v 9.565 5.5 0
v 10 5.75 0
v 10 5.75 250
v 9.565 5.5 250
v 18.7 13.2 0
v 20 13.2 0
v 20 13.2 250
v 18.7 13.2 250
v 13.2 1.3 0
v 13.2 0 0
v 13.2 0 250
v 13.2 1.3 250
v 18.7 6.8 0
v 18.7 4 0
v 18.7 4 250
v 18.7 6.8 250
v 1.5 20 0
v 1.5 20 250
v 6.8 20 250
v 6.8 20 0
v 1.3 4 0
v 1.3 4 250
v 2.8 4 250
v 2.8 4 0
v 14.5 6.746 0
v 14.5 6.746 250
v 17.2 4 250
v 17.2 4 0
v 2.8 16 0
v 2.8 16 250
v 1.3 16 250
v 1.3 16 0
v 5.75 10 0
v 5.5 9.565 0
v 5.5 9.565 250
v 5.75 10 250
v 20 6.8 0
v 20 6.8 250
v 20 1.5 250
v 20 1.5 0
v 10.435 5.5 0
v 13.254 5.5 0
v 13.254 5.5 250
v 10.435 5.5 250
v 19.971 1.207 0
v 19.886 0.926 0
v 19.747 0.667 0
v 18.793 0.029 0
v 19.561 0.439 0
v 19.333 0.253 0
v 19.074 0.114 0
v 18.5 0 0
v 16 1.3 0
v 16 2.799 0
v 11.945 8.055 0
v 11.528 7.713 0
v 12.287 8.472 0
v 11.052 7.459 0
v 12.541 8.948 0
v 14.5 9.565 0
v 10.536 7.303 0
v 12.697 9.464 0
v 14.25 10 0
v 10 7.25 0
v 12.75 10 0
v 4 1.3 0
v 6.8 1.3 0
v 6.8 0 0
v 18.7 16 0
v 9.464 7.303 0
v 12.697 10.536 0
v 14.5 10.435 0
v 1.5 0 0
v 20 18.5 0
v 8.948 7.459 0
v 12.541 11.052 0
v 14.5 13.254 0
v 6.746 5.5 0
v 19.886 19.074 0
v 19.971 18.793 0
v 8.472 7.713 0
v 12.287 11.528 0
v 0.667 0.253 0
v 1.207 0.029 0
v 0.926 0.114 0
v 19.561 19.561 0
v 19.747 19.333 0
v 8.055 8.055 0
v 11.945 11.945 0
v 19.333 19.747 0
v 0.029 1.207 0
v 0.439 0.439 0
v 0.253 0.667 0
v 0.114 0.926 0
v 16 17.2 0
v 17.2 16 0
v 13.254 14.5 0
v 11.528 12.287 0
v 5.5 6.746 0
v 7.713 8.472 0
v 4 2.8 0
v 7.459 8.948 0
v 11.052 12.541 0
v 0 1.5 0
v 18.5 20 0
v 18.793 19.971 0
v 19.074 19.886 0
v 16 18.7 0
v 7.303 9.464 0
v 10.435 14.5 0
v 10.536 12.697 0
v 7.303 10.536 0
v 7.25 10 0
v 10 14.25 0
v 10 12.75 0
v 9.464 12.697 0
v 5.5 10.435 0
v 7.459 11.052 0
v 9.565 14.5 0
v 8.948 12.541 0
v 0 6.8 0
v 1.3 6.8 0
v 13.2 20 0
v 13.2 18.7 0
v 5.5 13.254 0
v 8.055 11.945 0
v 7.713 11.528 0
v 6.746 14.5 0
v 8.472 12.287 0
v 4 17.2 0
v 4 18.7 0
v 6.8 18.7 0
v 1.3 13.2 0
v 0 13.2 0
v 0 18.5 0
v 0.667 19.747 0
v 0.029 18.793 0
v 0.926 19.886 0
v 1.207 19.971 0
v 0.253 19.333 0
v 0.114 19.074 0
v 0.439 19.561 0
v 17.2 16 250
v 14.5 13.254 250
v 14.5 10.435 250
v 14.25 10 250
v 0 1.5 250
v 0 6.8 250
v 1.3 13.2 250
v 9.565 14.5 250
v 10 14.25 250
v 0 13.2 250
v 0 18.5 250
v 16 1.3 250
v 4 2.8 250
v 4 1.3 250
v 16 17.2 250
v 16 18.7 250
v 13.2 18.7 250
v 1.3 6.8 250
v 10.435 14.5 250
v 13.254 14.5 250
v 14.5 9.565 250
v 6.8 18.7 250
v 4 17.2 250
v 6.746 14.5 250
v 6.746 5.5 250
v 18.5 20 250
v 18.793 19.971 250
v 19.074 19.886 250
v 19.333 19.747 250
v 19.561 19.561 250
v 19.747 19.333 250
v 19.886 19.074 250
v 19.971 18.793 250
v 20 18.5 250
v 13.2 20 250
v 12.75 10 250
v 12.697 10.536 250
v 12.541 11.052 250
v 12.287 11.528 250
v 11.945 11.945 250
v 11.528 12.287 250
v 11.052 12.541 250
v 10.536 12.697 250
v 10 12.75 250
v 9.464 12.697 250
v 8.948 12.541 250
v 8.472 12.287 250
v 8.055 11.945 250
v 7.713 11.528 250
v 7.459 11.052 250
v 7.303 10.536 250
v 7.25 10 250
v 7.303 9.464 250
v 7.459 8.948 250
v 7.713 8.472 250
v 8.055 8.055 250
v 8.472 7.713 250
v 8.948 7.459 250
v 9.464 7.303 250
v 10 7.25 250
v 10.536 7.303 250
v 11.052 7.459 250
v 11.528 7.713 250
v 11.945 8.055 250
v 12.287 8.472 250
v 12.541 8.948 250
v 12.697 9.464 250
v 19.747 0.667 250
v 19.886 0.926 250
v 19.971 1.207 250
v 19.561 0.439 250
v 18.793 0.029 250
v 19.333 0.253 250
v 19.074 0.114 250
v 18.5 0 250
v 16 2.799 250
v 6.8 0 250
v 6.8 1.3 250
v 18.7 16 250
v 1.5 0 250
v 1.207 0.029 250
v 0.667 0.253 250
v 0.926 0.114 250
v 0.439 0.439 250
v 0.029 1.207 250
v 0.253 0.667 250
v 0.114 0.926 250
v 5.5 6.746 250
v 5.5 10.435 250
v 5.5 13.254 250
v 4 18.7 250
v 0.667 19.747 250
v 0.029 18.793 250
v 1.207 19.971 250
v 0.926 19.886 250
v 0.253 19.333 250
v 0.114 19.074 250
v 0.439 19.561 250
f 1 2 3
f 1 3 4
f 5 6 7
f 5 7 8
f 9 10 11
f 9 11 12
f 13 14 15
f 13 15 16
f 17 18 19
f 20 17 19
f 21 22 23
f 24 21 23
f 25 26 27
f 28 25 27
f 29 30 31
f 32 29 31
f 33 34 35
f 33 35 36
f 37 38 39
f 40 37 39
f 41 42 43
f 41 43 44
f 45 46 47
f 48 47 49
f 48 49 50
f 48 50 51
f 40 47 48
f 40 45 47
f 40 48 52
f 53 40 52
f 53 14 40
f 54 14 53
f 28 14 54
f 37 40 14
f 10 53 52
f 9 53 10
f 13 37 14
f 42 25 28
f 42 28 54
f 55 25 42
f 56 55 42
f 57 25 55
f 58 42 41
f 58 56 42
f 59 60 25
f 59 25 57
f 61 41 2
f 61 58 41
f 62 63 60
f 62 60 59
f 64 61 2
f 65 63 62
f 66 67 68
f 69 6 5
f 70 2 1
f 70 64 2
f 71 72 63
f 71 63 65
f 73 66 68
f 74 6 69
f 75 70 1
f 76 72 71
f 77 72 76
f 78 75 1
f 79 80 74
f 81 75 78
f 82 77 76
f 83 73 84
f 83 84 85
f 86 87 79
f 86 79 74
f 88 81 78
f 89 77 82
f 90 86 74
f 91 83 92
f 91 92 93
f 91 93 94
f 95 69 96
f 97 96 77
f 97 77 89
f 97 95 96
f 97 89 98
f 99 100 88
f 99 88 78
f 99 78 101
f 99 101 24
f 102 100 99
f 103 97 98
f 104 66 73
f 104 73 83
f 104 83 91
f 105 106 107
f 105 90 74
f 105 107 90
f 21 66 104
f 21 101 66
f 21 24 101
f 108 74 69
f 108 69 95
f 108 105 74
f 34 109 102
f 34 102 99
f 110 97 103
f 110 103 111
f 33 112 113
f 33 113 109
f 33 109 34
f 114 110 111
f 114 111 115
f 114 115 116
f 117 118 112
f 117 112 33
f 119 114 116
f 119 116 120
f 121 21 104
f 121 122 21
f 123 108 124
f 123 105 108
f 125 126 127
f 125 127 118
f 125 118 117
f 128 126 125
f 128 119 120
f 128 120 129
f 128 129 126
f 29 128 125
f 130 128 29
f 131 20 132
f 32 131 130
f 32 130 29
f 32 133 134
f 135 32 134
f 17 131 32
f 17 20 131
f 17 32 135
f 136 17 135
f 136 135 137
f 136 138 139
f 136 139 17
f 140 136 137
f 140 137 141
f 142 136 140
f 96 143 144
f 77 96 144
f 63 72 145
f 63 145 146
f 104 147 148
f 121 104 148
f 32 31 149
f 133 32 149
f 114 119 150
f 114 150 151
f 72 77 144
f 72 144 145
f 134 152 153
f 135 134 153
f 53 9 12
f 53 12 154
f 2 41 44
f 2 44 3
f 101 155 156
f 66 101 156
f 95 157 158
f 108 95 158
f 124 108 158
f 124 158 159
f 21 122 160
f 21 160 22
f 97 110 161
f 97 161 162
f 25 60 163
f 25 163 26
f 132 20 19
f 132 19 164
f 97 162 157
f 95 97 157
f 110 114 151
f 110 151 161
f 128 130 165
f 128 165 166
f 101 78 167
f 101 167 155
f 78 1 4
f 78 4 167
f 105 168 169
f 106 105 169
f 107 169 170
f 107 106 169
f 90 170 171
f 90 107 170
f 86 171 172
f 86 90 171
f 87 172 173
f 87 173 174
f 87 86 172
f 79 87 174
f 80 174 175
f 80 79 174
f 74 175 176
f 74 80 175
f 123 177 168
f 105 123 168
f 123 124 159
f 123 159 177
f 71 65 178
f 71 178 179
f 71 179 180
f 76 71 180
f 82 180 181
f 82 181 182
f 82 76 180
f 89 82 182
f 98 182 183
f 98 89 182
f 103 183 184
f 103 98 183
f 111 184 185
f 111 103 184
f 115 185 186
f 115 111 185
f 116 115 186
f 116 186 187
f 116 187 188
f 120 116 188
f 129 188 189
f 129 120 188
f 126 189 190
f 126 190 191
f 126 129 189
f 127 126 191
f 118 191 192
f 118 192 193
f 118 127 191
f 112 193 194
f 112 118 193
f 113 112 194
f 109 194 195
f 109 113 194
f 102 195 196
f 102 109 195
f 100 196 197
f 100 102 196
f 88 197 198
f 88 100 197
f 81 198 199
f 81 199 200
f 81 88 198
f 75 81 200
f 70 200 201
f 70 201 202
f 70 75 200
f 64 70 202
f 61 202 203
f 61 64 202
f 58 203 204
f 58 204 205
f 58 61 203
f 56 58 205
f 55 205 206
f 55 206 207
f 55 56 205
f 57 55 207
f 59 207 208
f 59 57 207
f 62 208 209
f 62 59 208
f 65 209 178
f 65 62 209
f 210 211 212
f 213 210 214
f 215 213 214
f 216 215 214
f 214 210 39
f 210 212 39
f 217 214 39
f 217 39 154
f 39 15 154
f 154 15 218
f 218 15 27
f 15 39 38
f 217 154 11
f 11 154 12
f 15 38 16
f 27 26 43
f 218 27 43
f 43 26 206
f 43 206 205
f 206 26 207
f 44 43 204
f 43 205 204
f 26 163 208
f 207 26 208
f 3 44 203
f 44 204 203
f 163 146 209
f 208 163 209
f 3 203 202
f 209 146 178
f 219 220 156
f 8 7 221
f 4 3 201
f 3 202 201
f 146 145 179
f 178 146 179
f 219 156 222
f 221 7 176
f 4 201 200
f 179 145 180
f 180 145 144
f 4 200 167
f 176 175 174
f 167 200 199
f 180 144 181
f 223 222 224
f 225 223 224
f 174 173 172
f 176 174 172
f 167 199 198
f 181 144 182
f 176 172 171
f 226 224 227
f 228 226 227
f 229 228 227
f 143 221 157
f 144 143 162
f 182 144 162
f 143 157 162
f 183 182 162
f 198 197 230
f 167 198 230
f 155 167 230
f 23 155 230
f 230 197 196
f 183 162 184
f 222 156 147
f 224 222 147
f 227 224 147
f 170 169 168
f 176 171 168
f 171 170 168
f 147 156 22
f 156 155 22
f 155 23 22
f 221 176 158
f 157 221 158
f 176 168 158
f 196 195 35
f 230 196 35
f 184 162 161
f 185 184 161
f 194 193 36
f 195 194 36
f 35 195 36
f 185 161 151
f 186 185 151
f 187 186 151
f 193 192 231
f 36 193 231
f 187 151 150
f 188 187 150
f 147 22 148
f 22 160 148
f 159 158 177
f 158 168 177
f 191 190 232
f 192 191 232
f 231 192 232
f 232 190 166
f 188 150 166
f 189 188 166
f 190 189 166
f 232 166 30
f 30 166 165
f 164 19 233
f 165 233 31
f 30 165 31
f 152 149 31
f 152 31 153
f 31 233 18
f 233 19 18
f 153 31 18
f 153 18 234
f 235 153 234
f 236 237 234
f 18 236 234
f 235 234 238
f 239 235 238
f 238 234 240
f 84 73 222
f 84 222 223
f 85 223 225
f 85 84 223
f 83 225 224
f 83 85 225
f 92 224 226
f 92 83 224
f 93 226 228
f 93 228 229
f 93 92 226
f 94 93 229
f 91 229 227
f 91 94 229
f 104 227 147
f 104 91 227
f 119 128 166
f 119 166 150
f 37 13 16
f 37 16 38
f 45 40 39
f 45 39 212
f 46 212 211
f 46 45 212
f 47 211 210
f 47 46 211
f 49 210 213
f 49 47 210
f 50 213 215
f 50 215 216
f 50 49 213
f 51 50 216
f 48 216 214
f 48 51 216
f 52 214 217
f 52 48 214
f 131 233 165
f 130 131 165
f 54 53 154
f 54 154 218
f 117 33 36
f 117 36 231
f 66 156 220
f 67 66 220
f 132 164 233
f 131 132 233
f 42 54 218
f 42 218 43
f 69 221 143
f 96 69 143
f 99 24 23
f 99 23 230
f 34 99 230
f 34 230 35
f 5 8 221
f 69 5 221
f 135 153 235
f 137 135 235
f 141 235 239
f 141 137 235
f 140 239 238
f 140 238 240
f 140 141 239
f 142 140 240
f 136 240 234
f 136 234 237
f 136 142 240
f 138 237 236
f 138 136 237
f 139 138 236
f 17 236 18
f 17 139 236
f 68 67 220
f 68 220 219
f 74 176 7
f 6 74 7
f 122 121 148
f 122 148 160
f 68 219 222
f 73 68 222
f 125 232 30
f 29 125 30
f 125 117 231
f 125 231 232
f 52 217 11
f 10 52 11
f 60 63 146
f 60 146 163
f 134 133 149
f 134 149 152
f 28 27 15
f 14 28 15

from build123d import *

# Parameters (mm, degrees)
MODEL_R             = 2.75
BOSS_EXTRUDE1_DEPTH = 250


with BuildPart() as part:
    # Model → Boss-Extrude1 (new body)
    with BuildSketch(Plane.XY):
        with BuildLine():
            Line((1.499999935, 19.99999323), (6.799999935, 19.99999323))
            Line((6.799999935, 19.99999323), (6.799999935, 18.69999323))
            Line((6.799999935, 18.69999323), (3.999999935, 18.69999323))
            Line((3.999999935, 18.69999323), (3.999999935, 17.19999323))
            Line((3.999999935, 17.19999323), (6.745762647, 14.5))
            Line((6.745762647, 14.5), (9.565216879, 14.5))
            Line((9.565216879, 14.5), (10, 14.25))
            Line((10, 14.25), (10.434782606, 14.5))
            Line((10.434782606, 14.5), (13.254244108, 14.5))
            Line((13.254244108, 14.5), (15.999999935, 17.19999323))
            Line((15.999999935, 17.19999323), (15.999999935, 18.69999323))
            Line((15.999999935, 18.69999323), (13.199999935, 18.69999323))
            Line((13.199999935, 18.69999323), (13.199999935, 19.99999323))
            Line((13.199999935, 19.99999323), (18.499999935, 19.99999323))
            ThreePointArc((18.499999935, 19.99999323), (19.560660107, 19.560653402), (19.999999935, 18.49999323))
            Line((19.999999935, 18.49999323), (19.999999935, 13.19999323))
            Line((19.999999935, 13.19999323), (18.699999935, 13.19999323))
            Line((18.699999935, 13.19999323), (18.699999935, 15.99999323))
            Line((18.699999935, 15.99999323), (17.199999935, 15.99999323))
            Line((17.199999935, 15.99999323), (14.500000065, 13.254230518))
            Line((14.500000065, 13.254230518), (14.500000065, 10.434776138))
            Line((14.500000065, 10.434776138), (14.250000065, 9.99999323))
            Line((14.250000065, 9.99999323), (14.500000065, 9.565210911))
            Line((14.500000065, 9.565210911), (14.500000065, 6.745755942))
            Line((14.500000065, 6.745755942), (17.199999935, 3.99999323))
            Line((17.199999935, 3.99999323), (18.699999935, 3.99999323))
            Line((18.699999935, 3.99999323), (18.699999935, 6.79999323))
            Line((18.699999935, 6.79999323), (19.999999935, 6.79999323))
            Line((19.999999935, 6.79999323), (19.999999935, 1.49999323))
            ThreePointArc((19.999999935, 1.49999323), (19.560660107, 0.439333058), (18.499999935, -6.77e-06))
            Line((18.499999935, -6.77e-06), (13.199999935, -6.77e-06))
            Line((13.199999935, -6.77e-06), (13.199999935, 1.29999323))
            Line((13.199999935, 1.29999323), (15.999999935, 1.29999323))
            Line((15.999999935, 1.29999323), (15.999999935, 2.798703306))
            Line((15.999999935, 2.798703306), (13.254126104, 5.49999323))
            Line((13.254126104, 5.49999323), (10.434782606, 5.49999323))
            Line((10.434782606, 5.49999323), (10, 5.74999323))
            Line((10, 5.74999323), (9.565216879, 5.49999323))
            Line((9.565216879, 5.49999323), (6.745762647, 5.49999323))
            Line((6.745762647, 5.49999323), (3.999999935, 2.79999323))
            Line((3.999999935, 2.79999323), (3.999999935, 1.29999323))
            Line((3.999999935, 1.29999323), (6.799999935, 1.29999323))
            Line((6.799999935, 1.29999323), (6.799999935, -6.77e-06))
            Line((6.799999935, -6.77e-06), (1.499999935, -6.77e-06))
            ThreePointArc((1.499999935, -6.77e-06), (0.439339764, 0.439333058), (-6.5e-08, 1.49999323))
            Line((-6.5e-08, 1.49999323), (-6.5e-08, 6.79999323))
            Line((-6.5e-08, 6.79999323), (1.299999935, 6.79999323))
            Line((1.299999935, 6.79999323), (1.299999935, 3.99999323))
            Line((1.299999935, 3.99999323), (2.799999935, 3.99999323))
            Line((2.799999935, 3.99999323), (5.499999935, 6.745755942))
            Line((5.499999935, 6.745755942), (5.499999935, 9.565210911))
            Line((5.499999935, 9.565210911), (5.749999935, 9.99999323))
            Line((5.749999935, 9.99999323), (5.499999935, 10.434776138))
            Line((5.499999935, 10.434776138), (5.499999935, 13.254230518))
            Line((5.499999935, 13.254230518), (2.799999935, 15.99999323))
            Line((2.799999935, 15.99999323), (1.299999935, 15.99999323))
            Line((1.299999935, 15.99999323), (1.299999935, 13.19999323))
            Line((1.299999935, 13.19999323), (-6.5e-08, 13.19999323))
            Line((-6.5e-08, 13.19999323), (-6.5e-08, 18.49999323))
            ThreePointArc((-6.5e-08, 18.49999323), (0.439339764, 19.560653402), (1.499999935, 19.99999323))
        make_face()
        with Locations((10, 10)):
            Circle(MODEL_R, mode=Mode.SUBTRACT)
    extrude(amount=BOSS_EXTRUDE1_DEPTH)


solid = part.part
